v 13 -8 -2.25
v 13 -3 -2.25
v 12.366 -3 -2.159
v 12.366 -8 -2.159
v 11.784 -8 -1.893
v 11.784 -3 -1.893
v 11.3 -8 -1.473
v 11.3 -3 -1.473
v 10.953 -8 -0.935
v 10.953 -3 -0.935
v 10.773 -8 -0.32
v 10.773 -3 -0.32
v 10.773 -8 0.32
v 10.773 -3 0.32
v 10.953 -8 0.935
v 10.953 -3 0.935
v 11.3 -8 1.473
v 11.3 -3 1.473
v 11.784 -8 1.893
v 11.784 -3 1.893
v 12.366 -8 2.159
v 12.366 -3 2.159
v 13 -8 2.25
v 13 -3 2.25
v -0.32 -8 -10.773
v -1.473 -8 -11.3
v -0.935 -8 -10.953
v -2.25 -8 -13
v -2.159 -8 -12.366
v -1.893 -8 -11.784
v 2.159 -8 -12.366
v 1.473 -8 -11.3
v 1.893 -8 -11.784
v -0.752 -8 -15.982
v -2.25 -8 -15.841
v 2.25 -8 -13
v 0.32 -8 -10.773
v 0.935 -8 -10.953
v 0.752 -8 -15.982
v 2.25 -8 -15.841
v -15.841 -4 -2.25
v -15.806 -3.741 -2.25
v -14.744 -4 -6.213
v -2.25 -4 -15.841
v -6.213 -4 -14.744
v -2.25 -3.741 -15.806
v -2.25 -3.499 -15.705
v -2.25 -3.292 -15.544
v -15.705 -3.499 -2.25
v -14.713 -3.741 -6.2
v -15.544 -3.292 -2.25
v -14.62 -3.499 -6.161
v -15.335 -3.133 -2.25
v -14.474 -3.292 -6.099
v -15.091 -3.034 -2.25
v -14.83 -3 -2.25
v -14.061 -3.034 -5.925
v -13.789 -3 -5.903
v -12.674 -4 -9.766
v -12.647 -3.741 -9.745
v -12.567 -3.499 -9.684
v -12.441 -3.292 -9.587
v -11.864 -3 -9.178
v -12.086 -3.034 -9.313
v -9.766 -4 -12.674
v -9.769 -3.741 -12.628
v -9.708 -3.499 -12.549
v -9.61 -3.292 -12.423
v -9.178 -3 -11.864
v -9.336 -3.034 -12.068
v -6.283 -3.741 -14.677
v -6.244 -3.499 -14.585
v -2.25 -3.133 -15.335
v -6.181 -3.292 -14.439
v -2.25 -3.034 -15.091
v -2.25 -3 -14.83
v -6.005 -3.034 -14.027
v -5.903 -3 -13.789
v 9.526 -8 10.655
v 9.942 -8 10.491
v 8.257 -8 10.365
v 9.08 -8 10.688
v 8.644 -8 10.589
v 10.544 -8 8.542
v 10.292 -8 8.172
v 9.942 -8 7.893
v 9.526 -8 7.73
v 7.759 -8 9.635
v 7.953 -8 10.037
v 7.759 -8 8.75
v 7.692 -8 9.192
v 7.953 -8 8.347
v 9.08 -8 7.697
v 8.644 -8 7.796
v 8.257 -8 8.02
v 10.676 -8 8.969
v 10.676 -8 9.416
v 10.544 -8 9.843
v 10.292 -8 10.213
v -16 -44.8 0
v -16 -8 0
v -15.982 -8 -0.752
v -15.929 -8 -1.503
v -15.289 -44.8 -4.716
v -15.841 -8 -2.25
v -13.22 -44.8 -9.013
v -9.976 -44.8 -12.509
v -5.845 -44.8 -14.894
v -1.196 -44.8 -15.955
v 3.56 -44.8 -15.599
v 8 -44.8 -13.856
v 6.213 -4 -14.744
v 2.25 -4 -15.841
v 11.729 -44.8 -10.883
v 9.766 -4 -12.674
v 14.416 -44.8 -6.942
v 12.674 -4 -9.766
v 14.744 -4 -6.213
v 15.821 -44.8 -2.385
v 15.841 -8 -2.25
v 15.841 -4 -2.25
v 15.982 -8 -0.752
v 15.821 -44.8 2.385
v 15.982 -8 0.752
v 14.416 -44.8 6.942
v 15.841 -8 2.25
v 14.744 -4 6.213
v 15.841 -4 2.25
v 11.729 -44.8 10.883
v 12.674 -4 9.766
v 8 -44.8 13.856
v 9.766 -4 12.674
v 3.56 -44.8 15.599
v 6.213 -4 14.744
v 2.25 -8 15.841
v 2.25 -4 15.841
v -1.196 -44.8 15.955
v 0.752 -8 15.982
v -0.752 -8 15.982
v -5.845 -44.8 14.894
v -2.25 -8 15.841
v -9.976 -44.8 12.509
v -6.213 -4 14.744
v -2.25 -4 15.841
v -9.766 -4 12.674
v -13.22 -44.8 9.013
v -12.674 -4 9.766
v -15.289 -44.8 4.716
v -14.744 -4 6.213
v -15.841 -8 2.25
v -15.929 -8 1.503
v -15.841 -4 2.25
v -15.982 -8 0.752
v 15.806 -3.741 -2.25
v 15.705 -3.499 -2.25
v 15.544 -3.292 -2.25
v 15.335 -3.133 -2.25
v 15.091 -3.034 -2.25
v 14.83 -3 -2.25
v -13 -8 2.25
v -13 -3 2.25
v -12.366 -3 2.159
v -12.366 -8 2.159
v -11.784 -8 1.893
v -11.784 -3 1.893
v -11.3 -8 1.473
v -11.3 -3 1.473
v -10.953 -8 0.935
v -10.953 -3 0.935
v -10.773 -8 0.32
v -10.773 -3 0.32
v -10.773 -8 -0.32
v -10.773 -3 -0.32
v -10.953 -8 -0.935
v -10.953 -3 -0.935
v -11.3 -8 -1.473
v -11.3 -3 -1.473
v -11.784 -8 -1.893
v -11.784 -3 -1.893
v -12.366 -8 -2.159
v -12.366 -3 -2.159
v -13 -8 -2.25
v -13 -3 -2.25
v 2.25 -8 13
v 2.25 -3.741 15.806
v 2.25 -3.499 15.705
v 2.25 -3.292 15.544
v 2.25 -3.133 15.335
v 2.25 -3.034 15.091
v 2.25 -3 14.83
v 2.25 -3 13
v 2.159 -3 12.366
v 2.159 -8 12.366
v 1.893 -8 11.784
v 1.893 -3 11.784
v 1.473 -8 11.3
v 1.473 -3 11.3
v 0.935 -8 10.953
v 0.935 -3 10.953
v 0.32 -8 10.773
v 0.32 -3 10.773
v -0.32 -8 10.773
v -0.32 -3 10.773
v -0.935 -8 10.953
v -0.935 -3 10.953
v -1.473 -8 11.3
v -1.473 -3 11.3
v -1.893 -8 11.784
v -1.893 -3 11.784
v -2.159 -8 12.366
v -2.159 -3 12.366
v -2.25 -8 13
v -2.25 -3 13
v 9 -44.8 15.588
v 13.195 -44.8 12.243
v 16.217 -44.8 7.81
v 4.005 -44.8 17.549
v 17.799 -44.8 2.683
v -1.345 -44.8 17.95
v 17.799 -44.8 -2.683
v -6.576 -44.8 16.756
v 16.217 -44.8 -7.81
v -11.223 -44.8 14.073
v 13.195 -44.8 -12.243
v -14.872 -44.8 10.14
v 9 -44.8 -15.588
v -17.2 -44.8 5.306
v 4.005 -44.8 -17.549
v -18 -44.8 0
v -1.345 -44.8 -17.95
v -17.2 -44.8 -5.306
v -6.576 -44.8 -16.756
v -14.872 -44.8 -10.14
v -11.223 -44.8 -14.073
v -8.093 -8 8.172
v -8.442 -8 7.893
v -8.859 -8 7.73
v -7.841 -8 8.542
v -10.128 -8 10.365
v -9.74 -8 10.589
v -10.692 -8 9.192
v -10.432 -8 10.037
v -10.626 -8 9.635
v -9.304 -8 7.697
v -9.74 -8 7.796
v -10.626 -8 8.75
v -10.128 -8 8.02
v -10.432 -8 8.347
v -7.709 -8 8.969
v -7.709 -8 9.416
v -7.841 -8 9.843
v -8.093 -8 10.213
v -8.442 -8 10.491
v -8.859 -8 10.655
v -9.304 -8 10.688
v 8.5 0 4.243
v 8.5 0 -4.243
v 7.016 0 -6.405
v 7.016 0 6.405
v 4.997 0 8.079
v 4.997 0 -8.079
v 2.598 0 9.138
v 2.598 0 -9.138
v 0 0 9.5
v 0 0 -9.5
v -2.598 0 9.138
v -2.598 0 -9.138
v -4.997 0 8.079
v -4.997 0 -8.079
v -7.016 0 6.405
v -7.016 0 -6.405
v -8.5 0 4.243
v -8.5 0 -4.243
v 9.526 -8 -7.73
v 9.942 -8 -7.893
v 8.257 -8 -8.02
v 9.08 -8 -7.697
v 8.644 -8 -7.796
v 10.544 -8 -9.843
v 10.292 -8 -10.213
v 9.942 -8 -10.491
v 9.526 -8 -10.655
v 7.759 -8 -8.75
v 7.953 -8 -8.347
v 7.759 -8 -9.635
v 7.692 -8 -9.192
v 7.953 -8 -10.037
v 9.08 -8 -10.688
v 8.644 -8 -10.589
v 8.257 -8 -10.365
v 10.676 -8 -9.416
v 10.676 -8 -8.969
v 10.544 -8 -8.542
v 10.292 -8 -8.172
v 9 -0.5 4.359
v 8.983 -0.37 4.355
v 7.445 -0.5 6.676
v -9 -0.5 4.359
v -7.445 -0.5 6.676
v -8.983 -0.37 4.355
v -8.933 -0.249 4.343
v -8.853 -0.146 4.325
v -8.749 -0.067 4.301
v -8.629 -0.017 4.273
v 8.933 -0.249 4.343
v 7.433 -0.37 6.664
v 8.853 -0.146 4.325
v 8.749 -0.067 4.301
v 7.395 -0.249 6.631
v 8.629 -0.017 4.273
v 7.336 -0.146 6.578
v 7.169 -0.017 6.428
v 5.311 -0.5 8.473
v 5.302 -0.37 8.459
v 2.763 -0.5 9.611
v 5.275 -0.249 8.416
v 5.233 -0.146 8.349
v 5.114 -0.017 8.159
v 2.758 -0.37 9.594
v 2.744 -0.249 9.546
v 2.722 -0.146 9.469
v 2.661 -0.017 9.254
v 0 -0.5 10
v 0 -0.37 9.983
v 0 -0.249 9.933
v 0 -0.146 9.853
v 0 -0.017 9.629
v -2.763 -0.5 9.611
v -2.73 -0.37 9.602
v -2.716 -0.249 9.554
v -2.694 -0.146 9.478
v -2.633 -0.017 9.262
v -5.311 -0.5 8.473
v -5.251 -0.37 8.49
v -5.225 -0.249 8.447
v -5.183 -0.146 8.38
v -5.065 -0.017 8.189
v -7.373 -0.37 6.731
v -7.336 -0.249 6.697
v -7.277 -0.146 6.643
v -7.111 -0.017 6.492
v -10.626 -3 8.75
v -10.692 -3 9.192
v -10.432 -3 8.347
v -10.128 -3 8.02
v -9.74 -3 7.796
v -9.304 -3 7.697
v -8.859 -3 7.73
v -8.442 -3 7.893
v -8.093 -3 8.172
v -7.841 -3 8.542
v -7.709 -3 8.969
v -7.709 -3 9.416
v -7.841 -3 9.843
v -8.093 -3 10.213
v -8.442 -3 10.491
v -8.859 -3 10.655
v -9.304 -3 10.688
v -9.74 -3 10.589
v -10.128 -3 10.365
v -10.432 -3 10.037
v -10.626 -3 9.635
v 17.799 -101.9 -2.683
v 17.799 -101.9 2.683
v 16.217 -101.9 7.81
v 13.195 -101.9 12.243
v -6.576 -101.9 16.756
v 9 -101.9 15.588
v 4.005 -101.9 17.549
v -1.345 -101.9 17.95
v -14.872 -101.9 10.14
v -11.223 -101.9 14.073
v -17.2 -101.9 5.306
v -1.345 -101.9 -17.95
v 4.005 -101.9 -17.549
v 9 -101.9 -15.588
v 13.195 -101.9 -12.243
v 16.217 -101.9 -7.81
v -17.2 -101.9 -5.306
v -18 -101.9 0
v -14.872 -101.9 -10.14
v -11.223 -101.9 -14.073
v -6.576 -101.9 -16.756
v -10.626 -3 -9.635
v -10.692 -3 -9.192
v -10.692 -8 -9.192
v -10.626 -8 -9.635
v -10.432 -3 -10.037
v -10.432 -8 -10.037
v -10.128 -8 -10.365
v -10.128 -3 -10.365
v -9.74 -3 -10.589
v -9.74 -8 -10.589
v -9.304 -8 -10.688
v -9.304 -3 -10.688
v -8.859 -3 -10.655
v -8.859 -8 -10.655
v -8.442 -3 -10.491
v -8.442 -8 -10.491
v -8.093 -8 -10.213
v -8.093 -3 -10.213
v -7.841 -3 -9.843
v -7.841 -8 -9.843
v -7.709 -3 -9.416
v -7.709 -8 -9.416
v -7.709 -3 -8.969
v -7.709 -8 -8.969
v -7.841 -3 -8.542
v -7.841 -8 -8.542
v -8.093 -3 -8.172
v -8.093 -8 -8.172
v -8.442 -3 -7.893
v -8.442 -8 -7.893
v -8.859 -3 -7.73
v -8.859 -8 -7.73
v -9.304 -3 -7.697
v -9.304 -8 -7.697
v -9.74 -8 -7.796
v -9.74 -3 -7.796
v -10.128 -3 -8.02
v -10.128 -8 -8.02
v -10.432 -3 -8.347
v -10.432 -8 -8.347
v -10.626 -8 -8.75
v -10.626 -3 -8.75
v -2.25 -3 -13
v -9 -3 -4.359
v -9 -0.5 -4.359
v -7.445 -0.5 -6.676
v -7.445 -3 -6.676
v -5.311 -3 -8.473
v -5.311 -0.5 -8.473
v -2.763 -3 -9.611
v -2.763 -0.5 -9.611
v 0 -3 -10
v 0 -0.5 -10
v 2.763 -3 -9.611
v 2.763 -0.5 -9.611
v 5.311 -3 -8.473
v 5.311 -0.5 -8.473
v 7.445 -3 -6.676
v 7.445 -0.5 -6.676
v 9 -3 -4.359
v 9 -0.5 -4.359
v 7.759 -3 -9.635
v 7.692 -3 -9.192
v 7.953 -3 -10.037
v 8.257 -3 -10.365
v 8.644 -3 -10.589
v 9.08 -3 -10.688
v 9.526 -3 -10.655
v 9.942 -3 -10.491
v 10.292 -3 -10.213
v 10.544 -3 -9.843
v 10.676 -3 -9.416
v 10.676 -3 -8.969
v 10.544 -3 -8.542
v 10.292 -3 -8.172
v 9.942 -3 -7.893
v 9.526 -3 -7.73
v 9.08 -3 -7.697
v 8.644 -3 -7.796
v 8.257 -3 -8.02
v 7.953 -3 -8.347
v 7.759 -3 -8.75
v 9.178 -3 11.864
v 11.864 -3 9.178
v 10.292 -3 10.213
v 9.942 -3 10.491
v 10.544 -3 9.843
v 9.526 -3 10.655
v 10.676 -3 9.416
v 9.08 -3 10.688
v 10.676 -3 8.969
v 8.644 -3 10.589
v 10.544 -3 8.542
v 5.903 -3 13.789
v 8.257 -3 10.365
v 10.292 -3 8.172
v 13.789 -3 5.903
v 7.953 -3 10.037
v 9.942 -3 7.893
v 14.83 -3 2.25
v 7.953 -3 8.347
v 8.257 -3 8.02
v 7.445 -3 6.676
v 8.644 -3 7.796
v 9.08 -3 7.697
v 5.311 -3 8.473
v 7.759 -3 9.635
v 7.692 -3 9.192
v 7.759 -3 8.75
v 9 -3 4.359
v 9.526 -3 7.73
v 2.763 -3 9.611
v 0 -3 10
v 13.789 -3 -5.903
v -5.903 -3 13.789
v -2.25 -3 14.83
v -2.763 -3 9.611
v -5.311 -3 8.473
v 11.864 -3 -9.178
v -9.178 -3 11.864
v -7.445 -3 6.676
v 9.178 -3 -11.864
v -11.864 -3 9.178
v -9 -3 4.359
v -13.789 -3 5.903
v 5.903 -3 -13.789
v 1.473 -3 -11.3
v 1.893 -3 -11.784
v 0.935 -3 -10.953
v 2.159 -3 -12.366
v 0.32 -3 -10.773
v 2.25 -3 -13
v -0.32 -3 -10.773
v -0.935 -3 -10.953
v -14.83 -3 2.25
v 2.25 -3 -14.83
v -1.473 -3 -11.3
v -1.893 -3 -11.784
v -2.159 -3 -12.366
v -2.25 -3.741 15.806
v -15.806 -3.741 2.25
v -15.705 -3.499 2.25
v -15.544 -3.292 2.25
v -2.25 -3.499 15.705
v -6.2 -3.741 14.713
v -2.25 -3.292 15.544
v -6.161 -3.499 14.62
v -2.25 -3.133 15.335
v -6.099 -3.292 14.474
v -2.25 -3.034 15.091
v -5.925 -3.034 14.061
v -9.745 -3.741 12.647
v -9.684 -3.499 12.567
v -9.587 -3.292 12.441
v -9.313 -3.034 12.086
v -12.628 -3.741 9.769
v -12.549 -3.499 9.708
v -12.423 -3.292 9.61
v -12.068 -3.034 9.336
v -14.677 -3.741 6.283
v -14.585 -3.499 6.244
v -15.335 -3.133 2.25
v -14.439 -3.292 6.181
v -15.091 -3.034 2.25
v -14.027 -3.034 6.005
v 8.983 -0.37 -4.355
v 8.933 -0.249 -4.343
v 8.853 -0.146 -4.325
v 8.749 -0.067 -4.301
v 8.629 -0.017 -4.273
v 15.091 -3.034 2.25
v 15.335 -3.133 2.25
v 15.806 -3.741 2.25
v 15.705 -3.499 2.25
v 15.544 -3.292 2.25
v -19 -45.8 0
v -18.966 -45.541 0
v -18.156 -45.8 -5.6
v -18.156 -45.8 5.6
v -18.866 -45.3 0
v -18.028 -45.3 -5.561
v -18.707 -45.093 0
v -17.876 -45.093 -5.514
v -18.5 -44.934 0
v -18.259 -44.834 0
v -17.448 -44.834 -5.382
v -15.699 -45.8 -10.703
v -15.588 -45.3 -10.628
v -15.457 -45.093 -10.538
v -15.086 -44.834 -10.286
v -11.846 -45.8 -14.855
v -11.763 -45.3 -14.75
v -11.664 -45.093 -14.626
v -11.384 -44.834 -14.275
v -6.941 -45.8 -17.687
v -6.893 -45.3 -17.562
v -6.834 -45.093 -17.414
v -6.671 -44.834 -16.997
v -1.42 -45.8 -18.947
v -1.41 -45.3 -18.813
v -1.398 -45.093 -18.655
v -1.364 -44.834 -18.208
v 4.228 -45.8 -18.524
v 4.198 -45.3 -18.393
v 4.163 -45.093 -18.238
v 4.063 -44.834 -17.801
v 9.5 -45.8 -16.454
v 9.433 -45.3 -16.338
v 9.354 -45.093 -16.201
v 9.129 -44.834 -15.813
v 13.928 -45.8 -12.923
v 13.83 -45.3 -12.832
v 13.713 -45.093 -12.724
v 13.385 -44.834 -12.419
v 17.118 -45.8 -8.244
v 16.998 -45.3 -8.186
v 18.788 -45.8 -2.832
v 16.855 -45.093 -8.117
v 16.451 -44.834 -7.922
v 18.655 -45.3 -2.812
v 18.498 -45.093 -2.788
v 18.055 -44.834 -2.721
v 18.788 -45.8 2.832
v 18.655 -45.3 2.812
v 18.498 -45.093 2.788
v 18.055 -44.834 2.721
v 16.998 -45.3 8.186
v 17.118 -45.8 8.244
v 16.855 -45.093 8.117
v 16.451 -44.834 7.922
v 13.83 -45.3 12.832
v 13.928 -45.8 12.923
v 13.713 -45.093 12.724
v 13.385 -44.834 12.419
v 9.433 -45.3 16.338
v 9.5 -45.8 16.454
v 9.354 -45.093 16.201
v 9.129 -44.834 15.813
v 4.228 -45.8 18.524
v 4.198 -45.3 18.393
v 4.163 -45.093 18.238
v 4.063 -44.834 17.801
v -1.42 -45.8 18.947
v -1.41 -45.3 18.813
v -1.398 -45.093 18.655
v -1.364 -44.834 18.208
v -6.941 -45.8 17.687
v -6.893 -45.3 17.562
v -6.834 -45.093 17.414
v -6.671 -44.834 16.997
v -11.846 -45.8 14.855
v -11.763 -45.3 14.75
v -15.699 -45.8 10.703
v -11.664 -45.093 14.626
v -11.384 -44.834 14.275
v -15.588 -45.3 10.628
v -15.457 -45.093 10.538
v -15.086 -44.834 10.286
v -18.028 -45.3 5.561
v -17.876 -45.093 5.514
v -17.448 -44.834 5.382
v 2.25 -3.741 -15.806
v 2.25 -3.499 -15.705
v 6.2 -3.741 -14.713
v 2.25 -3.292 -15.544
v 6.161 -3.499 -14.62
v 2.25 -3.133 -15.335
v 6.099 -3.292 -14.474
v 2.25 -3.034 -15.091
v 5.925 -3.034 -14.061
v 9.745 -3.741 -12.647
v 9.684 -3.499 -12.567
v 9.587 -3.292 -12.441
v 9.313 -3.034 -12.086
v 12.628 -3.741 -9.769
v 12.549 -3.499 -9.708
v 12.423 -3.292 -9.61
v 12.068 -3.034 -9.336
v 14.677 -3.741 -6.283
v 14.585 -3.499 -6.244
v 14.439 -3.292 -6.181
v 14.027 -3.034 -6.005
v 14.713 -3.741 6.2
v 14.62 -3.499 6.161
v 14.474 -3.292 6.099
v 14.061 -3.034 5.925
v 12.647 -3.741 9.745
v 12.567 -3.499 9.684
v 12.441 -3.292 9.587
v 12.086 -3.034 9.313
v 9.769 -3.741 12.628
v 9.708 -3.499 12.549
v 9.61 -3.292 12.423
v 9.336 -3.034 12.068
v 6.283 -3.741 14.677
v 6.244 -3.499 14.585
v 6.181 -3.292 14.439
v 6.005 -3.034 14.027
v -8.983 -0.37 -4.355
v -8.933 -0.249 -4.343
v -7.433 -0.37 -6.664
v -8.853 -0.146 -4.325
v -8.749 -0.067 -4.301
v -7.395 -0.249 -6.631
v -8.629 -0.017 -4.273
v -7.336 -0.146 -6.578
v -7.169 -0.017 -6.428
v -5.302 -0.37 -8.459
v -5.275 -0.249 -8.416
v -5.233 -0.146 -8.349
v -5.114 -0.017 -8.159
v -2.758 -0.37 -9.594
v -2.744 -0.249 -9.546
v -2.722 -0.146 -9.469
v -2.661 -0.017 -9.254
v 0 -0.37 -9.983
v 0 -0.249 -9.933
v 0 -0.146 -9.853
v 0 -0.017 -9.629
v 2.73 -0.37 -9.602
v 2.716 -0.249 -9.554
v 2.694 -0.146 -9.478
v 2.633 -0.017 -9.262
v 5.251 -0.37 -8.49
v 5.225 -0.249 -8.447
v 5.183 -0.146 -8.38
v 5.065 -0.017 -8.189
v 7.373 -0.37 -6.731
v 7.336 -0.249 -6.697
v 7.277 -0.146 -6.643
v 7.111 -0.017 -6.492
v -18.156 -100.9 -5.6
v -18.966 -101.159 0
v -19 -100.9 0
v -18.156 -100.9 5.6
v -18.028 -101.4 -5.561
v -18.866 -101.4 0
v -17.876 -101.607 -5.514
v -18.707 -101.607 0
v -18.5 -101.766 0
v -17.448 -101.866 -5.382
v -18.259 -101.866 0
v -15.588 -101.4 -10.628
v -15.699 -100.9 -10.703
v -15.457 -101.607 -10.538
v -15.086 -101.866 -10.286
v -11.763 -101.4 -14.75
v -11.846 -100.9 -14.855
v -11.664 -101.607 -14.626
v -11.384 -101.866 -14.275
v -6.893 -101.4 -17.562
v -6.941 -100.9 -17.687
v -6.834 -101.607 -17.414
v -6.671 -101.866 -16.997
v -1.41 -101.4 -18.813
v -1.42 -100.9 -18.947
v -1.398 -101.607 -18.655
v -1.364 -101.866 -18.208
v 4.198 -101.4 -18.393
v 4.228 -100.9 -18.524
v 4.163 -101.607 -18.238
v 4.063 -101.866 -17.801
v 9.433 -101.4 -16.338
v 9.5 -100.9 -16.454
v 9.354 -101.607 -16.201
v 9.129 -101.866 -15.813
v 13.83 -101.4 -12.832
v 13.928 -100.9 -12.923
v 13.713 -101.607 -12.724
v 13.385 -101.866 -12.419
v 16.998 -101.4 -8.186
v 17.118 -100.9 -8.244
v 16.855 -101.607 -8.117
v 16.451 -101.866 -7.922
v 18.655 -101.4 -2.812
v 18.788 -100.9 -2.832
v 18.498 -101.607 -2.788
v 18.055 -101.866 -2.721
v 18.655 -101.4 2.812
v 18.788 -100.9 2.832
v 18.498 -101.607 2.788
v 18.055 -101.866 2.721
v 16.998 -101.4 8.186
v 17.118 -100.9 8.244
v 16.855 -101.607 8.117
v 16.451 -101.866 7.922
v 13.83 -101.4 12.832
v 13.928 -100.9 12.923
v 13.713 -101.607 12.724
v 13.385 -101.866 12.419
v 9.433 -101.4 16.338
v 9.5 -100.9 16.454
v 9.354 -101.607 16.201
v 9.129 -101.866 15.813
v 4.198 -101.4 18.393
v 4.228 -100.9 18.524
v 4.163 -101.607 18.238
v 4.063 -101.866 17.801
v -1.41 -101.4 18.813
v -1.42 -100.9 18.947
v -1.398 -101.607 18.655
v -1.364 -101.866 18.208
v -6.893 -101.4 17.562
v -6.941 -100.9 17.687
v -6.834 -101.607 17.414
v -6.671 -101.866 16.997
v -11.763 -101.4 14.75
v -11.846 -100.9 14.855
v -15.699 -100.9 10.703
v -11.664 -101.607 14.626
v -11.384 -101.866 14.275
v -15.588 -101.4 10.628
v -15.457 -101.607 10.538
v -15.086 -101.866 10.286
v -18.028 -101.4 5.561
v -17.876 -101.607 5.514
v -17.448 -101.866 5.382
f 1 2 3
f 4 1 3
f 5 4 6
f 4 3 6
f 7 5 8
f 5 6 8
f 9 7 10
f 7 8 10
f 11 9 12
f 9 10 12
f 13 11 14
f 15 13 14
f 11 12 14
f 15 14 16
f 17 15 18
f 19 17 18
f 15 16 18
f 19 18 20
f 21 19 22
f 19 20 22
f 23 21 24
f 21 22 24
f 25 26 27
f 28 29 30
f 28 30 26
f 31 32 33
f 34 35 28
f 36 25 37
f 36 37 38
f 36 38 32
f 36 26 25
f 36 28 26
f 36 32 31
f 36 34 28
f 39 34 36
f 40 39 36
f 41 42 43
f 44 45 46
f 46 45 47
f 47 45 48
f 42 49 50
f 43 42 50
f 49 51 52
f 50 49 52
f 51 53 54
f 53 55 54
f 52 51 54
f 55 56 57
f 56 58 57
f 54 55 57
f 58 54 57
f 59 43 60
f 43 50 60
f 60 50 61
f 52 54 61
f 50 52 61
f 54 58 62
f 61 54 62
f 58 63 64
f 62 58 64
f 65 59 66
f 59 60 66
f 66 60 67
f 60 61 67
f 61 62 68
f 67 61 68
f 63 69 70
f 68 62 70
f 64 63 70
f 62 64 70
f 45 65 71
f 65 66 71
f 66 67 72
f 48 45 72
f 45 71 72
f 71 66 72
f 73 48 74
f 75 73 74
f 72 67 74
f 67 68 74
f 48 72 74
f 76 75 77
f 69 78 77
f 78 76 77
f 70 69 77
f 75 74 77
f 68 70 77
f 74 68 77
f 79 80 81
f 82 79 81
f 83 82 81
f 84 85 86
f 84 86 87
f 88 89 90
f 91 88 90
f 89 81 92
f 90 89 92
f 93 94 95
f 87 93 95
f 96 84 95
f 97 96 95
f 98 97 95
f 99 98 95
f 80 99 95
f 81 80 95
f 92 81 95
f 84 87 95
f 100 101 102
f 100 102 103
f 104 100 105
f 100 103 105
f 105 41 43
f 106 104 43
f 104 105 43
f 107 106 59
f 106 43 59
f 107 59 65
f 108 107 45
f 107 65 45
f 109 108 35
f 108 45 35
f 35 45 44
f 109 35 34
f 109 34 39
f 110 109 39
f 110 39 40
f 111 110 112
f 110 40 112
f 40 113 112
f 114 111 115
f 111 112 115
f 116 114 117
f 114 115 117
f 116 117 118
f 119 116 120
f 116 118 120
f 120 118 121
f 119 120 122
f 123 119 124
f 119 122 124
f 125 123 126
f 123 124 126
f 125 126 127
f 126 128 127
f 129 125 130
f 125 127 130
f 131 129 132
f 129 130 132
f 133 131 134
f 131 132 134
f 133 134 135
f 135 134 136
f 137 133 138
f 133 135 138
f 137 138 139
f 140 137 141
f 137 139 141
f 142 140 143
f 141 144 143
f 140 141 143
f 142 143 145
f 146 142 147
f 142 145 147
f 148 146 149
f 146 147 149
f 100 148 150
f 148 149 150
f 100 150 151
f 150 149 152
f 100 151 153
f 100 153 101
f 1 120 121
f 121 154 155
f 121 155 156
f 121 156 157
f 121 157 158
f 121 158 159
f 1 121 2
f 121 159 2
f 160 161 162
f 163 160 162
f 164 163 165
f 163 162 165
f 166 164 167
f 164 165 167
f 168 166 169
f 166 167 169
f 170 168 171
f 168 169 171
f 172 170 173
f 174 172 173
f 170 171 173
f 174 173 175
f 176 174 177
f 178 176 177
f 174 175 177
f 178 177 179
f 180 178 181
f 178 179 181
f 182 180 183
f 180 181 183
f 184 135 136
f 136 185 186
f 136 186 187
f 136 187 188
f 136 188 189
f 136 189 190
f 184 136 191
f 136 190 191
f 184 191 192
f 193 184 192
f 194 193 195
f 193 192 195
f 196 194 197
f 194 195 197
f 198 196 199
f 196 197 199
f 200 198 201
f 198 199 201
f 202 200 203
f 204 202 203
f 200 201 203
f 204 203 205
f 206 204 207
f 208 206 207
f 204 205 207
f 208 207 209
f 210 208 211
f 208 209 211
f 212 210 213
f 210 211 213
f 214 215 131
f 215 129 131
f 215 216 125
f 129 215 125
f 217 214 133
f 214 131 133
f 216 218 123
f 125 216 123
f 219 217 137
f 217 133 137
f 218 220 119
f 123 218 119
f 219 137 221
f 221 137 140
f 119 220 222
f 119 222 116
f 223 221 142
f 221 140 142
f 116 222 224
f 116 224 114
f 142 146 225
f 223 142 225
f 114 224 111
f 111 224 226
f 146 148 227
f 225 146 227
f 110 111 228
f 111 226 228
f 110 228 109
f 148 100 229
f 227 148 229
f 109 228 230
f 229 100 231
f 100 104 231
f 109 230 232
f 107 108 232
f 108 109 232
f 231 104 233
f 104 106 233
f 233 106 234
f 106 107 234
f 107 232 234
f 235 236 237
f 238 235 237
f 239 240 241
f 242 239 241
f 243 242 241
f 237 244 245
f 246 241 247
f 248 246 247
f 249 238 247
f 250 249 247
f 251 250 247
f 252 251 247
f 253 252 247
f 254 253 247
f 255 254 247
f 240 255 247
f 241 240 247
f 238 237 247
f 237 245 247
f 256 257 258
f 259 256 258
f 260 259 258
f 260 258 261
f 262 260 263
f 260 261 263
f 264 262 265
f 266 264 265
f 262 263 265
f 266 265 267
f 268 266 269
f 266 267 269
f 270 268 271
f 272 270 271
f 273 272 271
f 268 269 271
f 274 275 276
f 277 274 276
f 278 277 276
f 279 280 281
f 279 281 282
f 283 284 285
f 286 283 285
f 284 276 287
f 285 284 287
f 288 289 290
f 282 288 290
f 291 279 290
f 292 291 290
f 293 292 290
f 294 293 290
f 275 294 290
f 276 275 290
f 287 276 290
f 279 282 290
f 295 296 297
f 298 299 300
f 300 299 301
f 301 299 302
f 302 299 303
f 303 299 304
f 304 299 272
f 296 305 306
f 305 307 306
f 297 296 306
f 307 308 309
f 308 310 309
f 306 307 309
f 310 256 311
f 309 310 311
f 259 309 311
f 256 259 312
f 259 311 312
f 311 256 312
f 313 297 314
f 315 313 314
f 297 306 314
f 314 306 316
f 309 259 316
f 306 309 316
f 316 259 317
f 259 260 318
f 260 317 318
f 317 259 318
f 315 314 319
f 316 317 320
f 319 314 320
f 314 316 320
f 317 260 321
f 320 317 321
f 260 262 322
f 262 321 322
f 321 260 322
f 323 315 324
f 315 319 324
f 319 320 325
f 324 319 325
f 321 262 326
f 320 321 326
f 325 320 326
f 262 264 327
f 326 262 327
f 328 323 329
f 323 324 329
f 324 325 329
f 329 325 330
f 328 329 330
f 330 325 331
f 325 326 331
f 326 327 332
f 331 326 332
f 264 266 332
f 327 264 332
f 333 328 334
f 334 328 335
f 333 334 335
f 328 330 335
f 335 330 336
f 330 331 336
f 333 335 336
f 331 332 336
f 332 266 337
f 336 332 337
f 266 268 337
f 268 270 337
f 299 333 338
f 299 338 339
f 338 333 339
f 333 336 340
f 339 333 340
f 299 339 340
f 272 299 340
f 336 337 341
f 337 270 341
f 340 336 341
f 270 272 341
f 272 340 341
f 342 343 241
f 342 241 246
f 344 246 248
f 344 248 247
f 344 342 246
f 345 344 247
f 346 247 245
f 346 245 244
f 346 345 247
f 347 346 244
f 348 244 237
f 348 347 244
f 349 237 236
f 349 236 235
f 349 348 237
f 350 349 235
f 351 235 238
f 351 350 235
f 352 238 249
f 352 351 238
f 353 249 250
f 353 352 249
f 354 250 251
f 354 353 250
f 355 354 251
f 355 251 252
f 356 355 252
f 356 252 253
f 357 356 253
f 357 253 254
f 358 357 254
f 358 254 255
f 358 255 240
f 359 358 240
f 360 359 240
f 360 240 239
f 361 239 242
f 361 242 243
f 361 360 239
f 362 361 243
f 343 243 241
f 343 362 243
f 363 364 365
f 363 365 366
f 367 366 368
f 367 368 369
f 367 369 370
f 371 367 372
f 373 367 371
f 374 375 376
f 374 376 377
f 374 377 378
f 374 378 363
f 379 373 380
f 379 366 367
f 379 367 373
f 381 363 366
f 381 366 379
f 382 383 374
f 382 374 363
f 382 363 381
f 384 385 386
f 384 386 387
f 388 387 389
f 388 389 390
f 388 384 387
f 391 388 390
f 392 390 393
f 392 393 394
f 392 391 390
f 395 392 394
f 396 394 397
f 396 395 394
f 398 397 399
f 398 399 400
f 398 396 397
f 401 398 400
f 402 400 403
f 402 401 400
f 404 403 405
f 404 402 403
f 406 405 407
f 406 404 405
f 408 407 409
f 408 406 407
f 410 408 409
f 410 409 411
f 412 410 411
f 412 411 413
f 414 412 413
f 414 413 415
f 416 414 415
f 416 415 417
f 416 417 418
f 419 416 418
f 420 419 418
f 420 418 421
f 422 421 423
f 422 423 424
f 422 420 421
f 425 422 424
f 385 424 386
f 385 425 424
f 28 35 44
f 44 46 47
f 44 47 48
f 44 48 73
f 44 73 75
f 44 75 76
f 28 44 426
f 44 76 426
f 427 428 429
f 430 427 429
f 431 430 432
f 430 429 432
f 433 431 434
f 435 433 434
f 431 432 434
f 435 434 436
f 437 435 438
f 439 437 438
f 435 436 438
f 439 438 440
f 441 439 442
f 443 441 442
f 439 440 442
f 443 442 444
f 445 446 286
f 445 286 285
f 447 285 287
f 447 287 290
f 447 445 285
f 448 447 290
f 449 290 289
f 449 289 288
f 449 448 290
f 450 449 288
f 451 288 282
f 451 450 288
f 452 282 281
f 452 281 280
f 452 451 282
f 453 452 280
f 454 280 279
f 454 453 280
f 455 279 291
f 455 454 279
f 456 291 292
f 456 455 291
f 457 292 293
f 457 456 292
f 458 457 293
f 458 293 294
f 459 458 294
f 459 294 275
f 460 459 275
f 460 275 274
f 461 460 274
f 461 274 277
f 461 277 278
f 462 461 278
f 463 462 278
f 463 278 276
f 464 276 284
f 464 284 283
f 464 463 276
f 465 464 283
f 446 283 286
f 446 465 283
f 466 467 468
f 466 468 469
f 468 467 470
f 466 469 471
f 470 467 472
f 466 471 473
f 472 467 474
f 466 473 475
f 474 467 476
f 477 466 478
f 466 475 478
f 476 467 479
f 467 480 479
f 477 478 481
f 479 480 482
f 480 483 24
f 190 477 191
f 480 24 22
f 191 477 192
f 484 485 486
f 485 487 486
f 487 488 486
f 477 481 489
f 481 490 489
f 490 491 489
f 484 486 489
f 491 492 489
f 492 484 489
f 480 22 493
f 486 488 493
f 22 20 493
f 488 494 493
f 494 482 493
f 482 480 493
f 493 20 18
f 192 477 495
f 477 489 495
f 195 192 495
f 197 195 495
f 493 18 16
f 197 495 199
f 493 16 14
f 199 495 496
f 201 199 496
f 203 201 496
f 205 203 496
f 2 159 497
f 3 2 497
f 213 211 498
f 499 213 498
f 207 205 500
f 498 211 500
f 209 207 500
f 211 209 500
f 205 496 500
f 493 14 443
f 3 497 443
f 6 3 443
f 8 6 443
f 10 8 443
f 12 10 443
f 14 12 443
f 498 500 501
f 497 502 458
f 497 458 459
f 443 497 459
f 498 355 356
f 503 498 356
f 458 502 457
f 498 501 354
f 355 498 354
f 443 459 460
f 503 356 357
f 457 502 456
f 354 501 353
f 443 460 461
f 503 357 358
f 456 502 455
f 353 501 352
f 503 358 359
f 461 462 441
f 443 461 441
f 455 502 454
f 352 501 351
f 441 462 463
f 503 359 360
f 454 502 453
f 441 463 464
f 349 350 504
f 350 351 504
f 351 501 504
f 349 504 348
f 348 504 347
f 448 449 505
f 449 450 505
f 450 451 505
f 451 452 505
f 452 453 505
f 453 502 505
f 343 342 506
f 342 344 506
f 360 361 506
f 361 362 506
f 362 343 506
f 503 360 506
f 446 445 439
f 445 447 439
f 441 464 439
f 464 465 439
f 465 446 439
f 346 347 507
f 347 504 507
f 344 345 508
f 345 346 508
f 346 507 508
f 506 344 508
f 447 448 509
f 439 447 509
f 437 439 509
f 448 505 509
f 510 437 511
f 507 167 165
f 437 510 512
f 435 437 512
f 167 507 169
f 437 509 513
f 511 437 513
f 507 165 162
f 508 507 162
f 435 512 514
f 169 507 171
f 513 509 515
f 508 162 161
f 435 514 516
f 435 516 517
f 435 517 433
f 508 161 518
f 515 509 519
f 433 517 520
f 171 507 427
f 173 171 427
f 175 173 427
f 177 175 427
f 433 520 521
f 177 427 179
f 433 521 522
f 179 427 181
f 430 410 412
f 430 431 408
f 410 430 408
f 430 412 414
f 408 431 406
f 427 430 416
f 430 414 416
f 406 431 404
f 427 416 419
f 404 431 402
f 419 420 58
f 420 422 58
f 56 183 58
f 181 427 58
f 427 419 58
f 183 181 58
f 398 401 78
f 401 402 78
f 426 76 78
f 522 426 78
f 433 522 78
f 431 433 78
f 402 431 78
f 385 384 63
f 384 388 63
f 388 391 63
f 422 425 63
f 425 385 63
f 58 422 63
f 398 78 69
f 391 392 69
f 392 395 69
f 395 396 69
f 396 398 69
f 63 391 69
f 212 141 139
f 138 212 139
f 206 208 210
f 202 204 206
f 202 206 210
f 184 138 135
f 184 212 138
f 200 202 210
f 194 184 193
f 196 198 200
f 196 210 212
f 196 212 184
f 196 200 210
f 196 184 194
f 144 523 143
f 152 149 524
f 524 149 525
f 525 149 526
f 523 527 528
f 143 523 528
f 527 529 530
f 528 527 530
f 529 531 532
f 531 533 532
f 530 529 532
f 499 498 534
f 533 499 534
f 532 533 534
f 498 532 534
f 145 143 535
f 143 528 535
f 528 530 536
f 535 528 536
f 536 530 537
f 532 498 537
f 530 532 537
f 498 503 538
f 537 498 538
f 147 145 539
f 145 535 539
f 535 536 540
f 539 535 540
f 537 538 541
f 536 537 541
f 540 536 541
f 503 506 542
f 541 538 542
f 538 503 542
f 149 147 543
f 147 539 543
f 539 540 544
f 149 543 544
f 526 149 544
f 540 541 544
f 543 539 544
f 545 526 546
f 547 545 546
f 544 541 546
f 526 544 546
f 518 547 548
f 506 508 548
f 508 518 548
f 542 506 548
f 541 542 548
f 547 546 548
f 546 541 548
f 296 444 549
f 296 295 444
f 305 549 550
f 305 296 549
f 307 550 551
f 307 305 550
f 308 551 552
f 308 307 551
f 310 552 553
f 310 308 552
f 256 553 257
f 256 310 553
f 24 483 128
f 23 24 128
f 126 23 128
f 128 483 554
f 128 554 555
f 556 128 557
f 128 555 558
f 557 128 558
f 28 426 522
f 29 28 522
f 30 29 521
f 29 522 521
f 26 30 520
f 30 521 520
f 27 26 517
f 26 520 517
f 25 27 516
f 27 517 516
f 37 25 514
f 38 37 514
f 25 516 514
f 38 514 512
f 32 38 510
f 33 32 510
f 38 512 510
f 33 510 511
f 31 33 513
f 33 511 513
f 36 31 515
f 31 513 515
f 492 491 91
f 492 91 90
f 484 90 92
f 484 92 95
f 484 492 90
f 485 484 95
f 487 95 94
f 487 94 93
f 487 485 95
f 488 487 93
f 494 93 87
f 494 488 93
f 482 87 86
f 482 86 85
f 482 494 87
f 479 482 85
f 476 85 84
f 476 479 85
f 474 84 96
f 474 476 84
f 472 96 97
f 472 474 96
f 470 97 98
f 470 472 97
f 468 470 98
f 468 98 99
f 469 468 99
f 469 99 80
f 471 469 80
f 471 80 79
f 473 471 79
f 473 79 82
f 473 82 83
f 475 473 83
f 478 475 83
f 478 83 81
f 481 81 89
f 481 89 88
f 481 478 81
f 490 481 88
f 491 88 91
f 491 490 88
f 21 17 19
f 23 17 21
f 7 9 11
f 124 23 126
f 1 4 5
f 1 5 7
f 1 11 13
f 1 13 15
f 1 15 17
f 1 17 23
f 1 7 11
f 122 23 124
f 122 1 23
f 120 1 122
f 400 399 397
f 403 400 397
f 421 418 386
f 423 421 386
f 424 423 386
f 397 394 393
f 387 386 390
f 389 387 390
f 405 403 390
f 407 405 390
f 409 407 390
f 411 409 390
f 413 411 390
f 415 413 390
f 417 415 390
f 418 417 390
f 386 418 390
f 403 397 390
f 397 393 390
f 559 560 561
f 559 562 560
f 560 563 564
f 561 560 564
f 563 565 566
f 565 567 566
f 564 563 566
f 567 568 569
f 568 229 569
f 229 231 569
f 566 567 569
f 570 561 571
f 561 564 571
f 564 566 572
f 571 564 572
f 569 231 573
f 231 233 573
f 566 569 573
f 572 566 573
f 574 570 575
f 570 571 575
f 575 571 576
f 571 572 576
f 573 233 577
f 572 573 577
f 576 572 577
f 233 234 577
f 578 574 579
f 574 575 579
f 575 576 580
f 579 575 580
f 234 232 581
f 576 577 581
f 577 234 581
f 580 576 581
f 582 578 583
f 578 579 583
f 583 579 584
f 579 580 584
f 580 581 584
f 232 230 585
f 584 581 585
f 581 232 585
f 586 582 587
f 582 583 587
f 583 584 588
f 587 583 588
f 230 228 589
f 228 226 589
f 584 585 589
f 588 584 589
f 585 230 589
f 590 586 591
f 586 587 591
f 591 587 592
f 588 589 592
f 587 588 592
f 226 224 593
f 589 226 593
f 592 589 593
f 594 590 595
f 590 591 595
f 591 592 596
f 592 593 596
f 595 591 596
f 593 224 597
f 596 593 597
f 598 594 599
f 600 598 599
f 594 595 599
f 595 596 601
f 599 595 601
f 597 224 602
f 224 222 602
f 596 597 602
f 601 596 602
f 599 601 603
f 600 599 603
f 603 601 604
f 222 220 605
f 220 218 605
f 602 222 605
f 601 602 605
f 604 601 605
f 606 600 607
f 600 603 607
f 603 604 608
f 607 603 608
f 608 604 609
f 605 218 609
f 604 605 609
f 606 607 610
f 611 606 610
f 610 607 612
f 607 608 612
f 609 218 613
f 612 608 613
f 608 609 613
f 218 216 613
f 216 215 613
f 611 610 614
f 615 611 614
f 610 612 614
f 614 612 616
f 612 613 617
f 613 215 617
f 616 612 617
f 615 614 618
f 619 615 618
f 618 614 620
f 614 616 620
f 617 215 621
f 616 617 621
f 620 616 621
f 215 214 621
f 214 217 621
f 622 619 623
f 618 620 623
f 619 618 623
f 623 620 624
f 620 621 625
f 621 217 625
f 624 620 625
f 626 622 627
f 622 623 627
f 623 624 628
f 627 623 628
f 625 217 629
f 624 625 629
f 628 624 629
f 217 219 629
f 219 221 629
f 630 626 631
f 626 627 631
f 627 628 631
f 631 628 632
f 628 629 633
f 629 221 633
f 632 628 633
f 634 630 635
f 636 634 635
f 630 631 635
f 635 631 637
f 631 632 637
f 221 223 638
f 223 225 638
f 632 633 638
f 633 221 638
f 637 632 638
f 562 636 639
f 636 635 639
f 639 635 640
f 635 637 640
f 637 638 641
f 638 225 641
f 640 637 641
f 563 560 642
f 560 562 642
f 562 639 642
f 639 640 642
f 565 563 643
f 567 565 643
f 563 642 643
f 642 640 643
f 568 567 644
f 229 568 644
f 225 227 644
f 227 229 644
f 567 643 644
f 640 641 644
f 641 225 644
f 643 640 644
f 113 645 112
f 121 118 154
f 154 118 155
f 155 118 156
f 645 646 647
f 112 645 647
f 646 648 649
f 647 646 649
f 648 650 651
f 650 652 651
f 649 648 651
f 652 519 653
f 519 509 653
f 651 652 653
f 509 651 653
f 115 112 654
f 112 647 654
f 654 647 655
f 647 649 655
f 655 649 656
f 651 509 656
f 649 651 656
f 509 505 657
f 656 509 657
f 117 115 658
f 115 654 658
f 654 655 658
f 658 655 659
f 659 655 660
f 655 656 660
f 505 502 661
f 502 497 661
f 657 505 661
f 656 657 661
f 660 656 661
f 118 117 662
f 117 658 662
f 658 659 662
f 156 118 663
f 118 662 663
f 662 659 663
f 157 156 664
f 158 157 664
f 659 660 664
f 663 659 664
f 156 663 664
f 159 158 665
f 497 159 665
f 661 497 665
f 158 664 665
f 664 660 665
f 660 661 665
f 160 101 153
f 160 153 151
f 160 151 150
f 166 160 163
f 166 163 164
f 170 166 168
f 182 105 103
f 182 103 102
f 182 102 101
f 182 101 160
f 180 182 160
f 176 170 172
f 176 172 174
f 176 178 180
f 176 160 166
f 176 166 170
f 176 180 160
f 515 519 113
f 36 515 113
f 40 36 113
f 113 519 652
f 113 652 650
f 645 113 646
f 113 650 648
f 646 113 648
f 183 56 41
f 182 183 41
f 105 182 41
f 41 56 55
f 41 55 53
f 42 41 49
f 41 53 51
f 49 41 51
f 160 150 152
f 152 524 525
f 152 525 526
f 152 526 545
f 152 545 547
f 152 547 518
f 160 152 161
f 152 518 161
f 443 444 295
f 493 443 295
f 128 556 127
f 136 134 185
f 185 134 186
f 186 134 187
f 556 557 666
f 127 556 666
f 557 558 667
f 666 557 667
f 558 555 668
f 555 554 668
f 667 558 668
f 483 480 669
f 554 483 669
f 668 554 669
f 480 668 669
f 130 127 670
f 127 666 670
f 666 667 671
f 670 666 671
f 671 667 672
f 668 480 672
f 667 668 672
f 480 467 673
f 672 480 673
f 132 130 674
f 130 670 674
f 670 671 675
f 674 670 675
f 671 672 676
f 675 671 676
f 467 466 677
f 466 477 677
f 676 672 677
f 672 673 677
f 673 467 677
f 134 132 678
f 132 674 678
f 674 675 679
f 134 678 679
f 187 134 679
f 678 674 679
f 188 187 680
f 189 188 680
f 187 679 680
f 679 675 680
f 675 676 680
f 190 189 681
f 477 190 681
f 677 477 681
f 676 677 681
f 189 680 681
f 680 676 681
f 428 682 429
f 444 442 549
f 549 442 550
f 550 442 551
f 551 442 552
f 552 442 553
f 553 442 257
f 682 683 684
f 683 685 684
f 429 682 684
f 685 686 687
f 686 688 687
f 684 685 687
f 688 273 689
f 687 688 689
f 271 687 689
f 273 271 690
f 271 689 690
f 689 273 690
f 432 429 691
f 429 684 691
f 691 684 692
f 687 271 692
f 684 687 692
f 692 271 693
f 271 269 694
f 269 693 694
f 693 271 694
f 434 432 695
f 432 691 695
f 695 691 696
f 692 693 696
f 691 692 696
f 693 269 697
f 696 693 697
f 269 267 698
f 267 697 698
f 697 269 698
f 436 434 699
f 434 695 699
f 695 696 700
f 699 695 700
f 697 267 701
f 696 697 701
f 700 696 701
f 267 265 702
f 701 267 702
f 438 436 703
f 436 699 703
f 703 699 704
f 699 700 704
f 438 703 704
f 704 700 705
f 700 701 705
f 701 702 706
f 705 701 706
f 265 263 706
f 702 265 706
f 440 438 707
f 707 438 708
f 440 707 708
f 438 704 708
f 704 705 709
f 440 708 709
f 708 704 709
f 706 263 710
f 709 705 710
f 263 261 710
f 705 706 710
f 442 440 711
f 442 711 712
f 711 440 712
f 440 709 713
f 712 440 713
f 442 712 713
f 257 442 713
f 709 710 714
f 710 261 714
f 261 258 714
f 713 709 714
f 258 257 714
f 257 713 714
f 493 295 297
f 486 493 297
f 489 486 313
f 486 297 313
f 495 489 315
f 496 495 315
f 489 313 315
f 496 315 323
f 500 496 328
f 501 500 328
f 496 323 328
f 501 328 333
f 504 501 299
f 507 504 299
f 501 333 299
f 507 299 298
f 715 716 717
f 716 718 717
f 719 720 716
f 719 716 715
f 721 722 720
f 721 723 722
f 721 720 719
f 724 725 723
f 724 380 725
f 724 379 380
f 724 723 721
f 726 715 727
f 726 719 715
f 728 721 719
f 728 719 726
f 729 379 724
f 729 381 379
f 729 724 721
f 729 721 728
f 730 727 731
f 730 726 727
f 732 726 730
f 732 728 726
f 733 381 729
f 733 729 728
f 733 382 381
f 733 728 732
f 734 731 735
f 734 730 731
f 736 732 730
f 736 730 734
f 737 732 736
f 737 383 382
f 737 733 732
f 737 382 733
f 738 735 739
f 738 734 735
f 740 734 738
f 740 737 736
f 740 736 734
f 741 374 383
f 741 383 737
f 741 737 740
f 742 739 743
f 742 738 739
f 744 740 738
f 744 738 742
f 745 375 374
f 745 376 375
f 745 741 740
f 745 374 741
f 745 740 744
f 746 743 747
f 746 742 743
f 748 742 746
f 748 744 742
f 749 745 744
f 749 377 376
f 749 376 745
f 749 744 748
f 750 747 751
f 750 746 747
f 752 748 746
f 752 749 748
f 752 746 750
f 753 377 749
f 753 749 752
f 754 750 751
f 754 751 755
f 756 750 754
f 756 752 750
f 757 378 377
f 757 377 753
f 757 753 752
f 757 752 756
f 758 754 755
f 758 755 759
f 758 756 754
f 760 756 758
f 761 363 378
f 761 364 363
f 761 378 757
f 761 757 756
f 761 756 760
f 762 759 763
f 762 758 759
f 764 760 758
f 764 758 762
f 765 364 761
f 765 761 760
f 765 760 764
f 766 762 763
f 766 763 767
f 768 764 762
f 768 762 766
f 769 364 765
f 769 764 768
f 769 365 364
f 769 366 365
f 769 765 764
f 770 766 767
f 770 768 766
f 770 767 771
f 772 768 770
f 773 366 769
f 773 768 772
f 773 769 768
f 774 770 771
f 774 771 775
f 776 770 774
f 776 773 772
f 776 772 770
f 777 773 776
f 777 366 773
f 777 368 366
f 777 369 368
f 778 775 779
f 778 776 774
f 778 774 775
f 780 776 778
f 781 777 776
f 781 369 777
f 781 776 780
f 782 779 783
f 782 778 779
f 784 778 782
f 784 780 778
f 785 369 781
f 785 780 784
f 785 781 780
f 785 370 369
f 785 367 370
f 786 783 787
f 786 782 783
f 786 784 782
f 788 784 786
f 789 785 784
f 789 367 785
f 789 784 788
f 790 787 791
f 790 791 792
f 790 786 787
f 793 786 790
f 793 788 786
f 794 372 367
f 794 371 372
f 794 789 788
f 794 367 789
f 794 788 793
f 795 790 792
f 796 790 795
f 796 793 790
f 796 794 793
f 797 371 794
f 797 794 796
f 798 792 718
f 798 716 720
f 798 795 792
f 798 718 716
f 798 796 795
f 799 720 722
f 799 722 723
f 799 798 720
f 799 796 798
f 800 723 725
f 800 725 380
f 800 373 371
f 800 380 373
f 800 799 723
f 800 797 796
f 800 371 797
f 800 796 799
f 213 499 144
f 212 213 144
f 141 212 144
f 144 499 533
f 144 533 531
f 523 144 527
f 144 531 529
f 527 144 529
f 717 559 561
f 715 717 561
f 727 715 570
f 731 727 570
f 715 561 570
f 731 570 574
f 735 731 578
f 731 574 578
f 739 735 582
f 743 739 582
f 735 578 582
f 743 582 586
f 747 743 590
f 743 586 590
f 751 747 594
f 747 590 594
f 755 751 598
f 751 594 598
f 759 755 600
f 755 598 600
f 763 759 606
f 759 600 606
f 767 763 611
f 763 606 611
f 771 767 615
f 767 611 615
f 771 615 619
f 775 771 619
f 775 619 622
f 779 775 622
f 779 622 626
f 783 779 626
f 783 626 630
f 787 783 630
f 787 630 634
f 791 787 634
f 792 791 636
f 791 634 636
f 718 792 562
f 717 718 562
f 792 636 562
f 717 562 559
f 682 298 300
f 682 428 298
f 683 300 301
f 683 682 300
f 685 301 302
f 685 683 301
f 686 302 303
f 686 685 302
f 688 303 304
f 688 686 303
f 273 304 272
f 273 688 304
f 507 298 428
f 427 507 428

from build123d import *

# Parameters (mm, degrees)
BOSS_EXTRUDE3_DEPTH = 3
SKETCH7_R           = 16
BOSS_EXTRUDE4_DEPTH = 41.8
SKETCH8_R           = 19
BOSS_EXTRUDE5_DEPTH = 57.1
FILLET1_R           = 1
FILLET2_R           = 0.5
SKETCH9_R           = 1.5
CUT_EXTRUDE2_DEPTH  = 5
FILLET3_R           = 1


with BuildPart() as part:
    # Sketch5 → Boss-Extrude3 (new body)
    with BuildSketch(Plane(origin=(0, 0, 0), x_dir=(1, 0, 0), z_dir=(0, 1, 0))):
        with BuildLine():
            Line((-9, -4.358898944), (-9, 4.358898944))
            ThreePointArc((-9, 4.358898944), (0, 10), (9, 4.358898944))
            Line((9, 4.358898944), (9, -4.358898944))
            ThreePointArc((9, -4.358898944), (0, -10), (-9, -4.358898944))
        make_face()
    extrude(amount=-BOSS_EXTRUDE3_DEPTH)

    # Sketch7 → Boss-Extrude4 (add)
    with BuildSketch(Plane(origin=(0, -3, 0), x_dir=(-1, 0, 0), z_dir=(0, -1, 0))):
        Circle(SKETCH7_R)
    extrude(amount=BOSS_EXTRUDE4_DEPTH)

    # Sketch8 → Boss-Extrude5 (add)
    with BuildSketch(Plane(origin=(0, -44.8, 0), x_dir=(-1, 0, 0), z_dir=(0, -1, 0))):
        Circle(SKETCH8_R)
    extrude(amount=BOSS_EXTRUDE5_DEPTH)

    # Fillet1
    fillet1_edges = [part.edges().sort_by_distance(p)[0] for p in [
        (16, -3, 0),
        (19, -44.8, 0),
    ]]
    fillet(fillet1_edges, radius=FILLET1_R)

    # Fillet2
    fillet2_edges = [part.edges().sort_by_distance(p)[0] for p in [
        (9, 0, 0),
        (0, 0, 10),
        (-9, 0, 0),
        (0, 0, -10),
    ]]
    fillet(fillet2_edges, radius=FILLET2_R)

    # Sketch9 → Cut-Extrude2 (cut)
    with BuildSketch(Plane(origin=(0, -3, 0), x_dir=(-1, 0, 0), z_dir=(0, -1, 0))):
        with Locations((9.192388155, -9.192388155)):
            Circle(SKETCH9_R)
        with Locations((-9.192388155, -9.192388155)):
            Circle(SKETCH9_R)
        with Locations((-9.192388155, 9.192388155)):
            Circle(SKETCH9_R)
        with Locations((9.192388155, 9.192388155)):
            Circle(SKETCH9_R)
        with BuildLine():
            Line((-17.5, -2.25), (-17.5, 2.25))
            Line((-17.5, 2.25), (-13, 2.25))
            ThreePointArc((-13, 2.25), (-10.75, 0), (-13, -2.25))
            Line((-13, -2.25), (-17.5, -2.25))
        make_face()
        with BuildLine():
            Line((2.25, -17.5), (-2.25, -17.5))
            Line((-2.25, -17.5), (-2.25, -13))
            ThreePointArc((-2.25, -13), (0, -10.75), (2.25, -13))
            Line((2.25, -13), (2.25, -17.5))
        make_face()
        with BuildLine():
            Line((-2.25, 17.5), (2.25, 17.5))
            Line((2.25, 17.5), (2.25, 13))
            ThreePointArc((2.25, 13), (0, 10.75), (-2.25, 13))
            Line((-2.25, 13), (-2.25, 17.5))
        make_face()
        with BuildLine():
            Line((17.5, 2.25), (17.5, -2.25))
            Line((17.5, -2.25), (13, -2.25))
            ThreePointArc((13, -2.25), (10.75, 0), (13, 2.25))
            Line((13, 2.25), (17.5, 2.25))
        make_face()
    extrude(amount=CUT_EXTRUDE2_DEPTH, mode=Mode.SUBTRACT)

    # Fillet3
    fillet3_edges = [part.edges().sort_by_distance(p)[0] for p in [
        (19, -101.9, 0),
    ]]
    fillet(fillet3_edges, radius=FILLET3_R)


solid = part.part
